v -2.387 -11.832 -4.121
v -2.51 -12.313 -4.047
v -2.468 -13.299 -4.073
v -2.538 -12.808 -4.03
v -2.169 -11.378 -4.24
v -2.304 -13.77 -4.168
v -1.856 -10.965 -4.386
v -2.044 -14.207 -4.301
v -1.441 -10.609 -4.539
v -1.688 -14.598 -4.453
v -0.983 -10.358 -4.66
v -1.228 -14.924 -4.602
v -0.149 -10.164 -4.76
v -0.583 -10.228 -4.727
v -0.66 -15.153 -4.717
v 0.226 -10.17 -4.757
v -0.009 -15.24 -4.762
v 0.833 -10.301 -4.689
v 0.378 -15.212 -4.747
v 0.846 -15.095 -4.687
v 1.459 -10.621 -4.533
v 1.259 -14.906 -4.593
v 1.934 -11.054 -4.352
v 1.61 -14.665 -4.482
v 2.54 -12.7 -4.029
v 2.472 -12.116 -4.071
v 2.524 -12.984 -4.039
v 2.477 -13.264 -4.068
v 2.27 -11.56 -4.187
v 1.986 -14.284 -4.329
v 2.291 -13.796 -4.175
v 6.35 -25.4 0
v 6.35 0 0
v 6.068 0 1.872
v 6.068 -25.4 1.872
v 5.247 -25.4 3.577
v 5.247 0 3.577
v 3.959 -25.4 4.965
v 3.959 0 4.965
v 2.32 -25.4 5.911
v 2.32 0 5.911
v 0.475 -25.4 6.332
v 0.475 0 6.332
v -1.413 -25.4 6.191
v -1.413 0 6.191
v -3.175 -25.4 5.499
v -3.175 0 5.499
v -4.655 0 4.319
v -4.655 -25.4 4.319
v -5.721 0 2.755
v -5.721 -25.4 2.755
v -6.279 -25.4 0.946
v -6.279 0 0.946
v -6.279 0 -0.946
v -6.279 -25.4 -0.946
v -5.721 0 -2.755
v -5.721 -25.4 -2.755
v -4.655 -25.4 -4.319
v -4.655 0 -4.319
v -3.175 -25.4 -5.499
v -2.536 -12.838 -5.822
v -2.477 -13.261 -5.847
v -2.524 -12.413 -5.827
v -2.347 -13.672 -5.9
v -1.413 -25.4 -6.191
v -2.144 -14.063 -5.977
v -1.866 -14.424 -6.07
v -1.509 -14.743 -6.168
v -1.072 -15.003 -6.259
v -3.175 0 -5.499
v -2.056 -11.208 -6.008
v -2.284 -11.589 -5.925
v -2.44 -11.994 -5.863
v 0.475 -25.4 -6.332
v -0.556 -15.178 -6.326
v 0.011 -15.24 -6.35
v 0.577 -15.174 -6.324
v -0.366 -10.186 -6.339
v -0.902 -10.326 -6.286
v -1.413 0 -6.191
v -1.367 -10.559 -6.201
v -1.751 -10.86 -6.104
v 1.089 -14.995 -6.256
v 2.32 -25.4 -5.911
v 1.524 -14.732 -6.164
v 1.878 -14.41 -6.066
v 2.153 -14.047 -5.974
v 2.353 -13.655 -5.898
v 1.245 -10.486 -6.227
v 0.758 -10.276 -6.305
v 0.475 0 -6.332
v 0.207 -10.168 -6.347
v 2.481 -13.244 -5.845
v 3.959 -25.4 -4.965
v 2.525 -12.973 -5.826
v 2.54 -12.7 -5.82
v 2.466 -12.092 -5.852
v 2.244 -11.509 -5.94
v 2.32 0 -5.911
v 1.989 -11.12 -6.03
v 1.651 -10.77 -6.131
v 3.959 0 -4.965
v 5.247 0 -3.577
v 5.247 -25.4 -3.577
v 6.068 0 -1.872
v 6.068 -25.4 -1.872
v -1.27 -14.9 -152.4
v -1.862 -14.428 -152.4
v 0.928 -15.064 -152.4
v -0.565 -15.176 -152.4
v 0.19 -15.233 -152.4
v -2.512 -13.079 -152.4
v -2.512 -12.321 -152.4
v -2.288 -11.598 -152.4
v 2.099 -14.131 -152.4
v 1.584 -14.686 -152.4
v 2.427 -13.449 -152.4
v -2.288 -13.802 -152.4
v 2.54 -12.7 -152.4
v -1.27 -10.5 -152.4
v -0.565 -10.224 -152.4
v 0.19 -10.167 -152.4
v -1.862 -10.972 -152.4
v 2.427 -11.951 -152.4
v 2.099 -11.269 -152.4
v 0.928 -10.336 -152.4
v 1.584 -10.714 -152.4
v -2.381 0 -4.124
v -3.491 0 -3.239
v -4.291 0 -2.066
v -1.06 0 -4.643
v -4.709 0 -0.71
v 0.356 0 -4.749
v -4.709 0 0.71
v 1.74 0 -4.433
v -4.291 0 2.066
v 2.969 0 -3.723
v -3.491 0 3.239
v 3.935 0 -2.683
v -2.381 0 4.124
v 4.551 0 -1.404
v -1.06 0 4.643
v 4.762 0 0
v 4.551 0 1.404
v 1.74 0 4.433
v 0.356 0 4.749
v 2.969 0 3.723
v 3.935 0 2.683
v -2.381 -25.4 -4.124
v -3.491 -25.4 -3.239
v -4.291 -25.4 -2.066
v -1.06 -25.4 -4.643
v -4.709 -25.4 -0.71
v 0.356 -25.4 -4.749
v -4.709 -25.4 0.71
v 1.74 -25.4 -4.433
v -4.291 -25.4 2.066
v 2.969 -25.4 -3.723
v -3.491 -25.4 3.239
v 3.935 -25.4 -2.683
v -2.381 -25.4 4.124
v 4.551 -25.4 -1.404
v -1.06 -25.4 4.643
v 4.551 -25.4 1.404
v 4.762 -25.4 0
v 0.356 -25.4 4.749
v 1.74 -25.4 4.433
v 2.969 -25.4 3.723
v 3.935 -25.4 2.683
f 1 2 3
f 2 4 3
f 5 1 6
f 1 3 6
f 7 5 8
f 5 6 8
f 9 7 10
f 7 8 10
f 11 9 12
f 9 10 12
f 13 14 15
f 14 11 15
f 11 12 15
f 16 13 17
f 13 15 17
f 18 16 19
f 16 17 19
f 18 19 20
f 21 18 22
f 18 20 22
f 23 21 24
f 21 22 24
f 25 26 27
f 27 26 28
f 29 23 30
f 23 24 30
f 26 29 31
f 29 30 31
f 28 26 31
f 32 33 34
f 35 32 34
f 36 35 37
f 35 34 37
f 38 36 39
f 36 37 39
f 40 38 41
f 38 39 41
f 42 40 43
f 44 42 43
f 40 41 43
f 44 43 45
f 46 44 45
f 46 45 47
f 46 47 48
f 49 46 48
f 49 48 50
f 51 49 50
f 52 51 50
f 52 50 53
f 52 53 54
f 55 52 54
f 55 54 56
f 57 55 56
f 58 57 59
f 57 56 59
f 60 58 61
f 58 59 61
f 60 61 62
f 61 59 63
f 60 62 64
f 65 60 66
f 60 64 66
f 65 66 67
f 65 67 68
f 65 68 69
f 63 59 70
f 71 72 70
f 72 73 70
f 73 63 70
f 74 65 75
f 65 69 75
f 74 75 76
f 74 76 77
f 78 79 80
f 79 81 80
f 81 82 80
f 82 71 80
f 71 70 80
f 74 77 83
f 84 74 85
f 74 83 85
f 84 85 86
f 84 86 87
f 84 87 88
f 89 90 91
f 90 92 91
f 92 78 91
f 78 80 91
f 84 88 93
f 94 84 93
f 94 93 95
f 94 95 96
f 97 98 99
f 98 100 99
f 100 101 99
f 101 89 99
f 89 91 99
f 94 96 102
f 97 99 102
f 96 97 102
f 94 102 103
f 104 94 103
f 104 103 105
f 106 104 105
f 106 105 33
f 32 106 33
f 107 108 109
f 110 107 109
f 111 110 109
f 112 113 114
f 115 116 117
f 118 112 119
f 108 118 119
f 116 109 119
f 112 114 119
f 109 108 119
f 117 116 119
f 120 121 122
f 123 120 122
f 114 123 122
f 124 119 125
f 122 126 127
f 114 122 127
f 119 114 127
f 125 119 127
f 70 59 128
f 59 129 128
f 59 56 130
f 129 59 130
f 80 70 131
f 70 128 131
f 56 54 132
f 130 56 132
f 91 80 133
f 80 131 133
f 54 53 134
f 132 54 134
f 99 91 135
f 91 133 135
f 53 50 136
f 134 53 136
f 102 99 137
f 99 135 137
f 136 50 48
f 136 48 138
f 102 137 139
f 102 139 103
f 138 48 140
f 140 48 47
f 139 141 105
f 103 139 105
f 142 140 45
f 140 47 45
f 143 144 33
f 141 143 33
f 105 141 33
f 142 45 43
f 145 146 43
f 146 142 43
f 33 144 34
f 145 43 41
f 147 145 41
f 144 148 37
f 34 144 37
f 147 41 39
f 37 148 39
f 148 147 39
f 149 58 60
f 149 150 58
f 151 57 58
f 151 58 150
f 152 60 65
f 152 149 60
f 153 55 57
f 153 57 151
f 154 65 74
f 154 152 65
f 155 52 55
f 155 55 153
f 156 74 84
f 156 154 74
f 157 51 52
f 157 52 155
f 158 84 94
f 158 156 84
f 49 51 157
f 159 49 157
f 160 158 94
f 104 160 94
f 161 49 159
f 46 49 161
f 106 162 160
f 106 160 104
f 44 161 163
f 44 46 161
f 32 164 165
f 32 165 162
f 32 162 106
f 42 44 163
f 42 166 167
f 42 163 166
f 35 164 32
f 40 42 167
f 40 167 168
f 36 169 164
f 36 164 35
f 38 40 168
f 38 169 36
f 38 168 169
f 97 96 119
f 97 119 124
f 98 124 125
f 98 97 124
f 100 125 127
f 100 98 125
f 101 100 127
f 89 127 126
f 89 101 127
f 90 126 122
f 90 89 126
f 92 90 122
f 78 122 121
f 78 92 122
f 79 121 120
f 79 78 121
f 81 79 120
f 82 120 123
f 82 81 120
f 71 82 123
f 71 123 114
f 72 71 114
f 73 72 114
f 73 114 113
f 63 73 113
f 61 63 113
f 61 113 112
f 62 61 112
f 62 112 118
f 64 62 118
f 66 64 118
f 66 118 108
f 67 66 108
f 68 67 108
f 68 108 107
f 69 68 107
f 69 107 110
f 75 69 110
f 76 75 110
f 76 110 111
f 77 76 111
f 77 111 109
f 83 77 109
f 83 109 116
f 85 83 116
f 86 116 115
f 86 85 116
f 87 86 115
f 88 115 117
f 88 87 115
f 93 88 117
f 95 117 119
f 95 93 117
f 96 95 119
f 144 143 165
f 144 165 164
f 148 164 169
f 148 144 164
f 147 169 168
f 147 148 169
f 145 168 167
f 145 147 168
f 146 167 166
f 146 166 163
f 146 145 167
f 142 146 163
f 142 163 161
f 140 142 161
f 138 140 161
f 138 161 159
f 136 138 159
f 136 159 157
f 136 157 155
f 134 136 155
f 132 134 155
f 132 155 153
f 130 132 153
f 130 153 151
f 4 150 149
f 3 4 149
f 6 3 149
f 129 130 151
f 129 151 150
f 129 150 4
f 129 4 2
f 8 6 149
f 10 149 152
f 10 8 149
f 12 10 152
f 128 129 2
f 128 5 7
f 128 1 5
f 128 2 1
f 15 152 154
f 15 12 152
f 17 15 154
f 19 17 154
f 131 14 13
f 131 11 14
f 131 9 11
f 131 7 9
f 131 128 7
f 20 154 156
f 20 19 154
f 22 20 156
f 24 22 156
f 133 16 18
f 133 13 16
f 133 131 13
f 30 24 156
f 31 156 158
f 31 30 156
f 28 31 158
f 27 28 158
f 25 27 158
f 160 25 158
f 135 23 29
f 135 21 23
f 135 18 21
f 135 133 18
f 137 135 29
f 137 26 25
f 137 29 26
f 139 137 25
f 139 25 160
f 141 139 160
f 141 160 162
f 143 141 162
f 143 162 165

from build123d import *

# Parameters (mm, degrees)
F0_R     = 6.35
F0_R_2   = 4.7625
F1_DEPTH = 25.4
F2_R     = 2.54
F3_DEPTH = 152.4
F4_R     = 4.7625
F5_DEPTH = 25.4


with BuildPart() as f1:
    # F0 (on Front) → F1 (new body)
    with BuildSketch(Plane.XZ):
        Circle(F0_R)
        Circle(F0_R_2, mode=Mode.SUBTRACT)
    extrude(amount=F1_DEPTH)

    # F2 (on Top) → F3 (join)
    with BuildSketch(Plane.XY):
        with Locations((0, -12.7)):
            Circle(F2_R)
    extrude(amount=-F3_DEPTH)

    # F4 (on face) → F5 (cut)
    with BuildSketch(Plane.XZ.offset(25.4)):
        Circle(F4_R)
    extrude(amount=-F5_DEPTH, mode=Mode.SUBTRACT)


solid = f1.part
